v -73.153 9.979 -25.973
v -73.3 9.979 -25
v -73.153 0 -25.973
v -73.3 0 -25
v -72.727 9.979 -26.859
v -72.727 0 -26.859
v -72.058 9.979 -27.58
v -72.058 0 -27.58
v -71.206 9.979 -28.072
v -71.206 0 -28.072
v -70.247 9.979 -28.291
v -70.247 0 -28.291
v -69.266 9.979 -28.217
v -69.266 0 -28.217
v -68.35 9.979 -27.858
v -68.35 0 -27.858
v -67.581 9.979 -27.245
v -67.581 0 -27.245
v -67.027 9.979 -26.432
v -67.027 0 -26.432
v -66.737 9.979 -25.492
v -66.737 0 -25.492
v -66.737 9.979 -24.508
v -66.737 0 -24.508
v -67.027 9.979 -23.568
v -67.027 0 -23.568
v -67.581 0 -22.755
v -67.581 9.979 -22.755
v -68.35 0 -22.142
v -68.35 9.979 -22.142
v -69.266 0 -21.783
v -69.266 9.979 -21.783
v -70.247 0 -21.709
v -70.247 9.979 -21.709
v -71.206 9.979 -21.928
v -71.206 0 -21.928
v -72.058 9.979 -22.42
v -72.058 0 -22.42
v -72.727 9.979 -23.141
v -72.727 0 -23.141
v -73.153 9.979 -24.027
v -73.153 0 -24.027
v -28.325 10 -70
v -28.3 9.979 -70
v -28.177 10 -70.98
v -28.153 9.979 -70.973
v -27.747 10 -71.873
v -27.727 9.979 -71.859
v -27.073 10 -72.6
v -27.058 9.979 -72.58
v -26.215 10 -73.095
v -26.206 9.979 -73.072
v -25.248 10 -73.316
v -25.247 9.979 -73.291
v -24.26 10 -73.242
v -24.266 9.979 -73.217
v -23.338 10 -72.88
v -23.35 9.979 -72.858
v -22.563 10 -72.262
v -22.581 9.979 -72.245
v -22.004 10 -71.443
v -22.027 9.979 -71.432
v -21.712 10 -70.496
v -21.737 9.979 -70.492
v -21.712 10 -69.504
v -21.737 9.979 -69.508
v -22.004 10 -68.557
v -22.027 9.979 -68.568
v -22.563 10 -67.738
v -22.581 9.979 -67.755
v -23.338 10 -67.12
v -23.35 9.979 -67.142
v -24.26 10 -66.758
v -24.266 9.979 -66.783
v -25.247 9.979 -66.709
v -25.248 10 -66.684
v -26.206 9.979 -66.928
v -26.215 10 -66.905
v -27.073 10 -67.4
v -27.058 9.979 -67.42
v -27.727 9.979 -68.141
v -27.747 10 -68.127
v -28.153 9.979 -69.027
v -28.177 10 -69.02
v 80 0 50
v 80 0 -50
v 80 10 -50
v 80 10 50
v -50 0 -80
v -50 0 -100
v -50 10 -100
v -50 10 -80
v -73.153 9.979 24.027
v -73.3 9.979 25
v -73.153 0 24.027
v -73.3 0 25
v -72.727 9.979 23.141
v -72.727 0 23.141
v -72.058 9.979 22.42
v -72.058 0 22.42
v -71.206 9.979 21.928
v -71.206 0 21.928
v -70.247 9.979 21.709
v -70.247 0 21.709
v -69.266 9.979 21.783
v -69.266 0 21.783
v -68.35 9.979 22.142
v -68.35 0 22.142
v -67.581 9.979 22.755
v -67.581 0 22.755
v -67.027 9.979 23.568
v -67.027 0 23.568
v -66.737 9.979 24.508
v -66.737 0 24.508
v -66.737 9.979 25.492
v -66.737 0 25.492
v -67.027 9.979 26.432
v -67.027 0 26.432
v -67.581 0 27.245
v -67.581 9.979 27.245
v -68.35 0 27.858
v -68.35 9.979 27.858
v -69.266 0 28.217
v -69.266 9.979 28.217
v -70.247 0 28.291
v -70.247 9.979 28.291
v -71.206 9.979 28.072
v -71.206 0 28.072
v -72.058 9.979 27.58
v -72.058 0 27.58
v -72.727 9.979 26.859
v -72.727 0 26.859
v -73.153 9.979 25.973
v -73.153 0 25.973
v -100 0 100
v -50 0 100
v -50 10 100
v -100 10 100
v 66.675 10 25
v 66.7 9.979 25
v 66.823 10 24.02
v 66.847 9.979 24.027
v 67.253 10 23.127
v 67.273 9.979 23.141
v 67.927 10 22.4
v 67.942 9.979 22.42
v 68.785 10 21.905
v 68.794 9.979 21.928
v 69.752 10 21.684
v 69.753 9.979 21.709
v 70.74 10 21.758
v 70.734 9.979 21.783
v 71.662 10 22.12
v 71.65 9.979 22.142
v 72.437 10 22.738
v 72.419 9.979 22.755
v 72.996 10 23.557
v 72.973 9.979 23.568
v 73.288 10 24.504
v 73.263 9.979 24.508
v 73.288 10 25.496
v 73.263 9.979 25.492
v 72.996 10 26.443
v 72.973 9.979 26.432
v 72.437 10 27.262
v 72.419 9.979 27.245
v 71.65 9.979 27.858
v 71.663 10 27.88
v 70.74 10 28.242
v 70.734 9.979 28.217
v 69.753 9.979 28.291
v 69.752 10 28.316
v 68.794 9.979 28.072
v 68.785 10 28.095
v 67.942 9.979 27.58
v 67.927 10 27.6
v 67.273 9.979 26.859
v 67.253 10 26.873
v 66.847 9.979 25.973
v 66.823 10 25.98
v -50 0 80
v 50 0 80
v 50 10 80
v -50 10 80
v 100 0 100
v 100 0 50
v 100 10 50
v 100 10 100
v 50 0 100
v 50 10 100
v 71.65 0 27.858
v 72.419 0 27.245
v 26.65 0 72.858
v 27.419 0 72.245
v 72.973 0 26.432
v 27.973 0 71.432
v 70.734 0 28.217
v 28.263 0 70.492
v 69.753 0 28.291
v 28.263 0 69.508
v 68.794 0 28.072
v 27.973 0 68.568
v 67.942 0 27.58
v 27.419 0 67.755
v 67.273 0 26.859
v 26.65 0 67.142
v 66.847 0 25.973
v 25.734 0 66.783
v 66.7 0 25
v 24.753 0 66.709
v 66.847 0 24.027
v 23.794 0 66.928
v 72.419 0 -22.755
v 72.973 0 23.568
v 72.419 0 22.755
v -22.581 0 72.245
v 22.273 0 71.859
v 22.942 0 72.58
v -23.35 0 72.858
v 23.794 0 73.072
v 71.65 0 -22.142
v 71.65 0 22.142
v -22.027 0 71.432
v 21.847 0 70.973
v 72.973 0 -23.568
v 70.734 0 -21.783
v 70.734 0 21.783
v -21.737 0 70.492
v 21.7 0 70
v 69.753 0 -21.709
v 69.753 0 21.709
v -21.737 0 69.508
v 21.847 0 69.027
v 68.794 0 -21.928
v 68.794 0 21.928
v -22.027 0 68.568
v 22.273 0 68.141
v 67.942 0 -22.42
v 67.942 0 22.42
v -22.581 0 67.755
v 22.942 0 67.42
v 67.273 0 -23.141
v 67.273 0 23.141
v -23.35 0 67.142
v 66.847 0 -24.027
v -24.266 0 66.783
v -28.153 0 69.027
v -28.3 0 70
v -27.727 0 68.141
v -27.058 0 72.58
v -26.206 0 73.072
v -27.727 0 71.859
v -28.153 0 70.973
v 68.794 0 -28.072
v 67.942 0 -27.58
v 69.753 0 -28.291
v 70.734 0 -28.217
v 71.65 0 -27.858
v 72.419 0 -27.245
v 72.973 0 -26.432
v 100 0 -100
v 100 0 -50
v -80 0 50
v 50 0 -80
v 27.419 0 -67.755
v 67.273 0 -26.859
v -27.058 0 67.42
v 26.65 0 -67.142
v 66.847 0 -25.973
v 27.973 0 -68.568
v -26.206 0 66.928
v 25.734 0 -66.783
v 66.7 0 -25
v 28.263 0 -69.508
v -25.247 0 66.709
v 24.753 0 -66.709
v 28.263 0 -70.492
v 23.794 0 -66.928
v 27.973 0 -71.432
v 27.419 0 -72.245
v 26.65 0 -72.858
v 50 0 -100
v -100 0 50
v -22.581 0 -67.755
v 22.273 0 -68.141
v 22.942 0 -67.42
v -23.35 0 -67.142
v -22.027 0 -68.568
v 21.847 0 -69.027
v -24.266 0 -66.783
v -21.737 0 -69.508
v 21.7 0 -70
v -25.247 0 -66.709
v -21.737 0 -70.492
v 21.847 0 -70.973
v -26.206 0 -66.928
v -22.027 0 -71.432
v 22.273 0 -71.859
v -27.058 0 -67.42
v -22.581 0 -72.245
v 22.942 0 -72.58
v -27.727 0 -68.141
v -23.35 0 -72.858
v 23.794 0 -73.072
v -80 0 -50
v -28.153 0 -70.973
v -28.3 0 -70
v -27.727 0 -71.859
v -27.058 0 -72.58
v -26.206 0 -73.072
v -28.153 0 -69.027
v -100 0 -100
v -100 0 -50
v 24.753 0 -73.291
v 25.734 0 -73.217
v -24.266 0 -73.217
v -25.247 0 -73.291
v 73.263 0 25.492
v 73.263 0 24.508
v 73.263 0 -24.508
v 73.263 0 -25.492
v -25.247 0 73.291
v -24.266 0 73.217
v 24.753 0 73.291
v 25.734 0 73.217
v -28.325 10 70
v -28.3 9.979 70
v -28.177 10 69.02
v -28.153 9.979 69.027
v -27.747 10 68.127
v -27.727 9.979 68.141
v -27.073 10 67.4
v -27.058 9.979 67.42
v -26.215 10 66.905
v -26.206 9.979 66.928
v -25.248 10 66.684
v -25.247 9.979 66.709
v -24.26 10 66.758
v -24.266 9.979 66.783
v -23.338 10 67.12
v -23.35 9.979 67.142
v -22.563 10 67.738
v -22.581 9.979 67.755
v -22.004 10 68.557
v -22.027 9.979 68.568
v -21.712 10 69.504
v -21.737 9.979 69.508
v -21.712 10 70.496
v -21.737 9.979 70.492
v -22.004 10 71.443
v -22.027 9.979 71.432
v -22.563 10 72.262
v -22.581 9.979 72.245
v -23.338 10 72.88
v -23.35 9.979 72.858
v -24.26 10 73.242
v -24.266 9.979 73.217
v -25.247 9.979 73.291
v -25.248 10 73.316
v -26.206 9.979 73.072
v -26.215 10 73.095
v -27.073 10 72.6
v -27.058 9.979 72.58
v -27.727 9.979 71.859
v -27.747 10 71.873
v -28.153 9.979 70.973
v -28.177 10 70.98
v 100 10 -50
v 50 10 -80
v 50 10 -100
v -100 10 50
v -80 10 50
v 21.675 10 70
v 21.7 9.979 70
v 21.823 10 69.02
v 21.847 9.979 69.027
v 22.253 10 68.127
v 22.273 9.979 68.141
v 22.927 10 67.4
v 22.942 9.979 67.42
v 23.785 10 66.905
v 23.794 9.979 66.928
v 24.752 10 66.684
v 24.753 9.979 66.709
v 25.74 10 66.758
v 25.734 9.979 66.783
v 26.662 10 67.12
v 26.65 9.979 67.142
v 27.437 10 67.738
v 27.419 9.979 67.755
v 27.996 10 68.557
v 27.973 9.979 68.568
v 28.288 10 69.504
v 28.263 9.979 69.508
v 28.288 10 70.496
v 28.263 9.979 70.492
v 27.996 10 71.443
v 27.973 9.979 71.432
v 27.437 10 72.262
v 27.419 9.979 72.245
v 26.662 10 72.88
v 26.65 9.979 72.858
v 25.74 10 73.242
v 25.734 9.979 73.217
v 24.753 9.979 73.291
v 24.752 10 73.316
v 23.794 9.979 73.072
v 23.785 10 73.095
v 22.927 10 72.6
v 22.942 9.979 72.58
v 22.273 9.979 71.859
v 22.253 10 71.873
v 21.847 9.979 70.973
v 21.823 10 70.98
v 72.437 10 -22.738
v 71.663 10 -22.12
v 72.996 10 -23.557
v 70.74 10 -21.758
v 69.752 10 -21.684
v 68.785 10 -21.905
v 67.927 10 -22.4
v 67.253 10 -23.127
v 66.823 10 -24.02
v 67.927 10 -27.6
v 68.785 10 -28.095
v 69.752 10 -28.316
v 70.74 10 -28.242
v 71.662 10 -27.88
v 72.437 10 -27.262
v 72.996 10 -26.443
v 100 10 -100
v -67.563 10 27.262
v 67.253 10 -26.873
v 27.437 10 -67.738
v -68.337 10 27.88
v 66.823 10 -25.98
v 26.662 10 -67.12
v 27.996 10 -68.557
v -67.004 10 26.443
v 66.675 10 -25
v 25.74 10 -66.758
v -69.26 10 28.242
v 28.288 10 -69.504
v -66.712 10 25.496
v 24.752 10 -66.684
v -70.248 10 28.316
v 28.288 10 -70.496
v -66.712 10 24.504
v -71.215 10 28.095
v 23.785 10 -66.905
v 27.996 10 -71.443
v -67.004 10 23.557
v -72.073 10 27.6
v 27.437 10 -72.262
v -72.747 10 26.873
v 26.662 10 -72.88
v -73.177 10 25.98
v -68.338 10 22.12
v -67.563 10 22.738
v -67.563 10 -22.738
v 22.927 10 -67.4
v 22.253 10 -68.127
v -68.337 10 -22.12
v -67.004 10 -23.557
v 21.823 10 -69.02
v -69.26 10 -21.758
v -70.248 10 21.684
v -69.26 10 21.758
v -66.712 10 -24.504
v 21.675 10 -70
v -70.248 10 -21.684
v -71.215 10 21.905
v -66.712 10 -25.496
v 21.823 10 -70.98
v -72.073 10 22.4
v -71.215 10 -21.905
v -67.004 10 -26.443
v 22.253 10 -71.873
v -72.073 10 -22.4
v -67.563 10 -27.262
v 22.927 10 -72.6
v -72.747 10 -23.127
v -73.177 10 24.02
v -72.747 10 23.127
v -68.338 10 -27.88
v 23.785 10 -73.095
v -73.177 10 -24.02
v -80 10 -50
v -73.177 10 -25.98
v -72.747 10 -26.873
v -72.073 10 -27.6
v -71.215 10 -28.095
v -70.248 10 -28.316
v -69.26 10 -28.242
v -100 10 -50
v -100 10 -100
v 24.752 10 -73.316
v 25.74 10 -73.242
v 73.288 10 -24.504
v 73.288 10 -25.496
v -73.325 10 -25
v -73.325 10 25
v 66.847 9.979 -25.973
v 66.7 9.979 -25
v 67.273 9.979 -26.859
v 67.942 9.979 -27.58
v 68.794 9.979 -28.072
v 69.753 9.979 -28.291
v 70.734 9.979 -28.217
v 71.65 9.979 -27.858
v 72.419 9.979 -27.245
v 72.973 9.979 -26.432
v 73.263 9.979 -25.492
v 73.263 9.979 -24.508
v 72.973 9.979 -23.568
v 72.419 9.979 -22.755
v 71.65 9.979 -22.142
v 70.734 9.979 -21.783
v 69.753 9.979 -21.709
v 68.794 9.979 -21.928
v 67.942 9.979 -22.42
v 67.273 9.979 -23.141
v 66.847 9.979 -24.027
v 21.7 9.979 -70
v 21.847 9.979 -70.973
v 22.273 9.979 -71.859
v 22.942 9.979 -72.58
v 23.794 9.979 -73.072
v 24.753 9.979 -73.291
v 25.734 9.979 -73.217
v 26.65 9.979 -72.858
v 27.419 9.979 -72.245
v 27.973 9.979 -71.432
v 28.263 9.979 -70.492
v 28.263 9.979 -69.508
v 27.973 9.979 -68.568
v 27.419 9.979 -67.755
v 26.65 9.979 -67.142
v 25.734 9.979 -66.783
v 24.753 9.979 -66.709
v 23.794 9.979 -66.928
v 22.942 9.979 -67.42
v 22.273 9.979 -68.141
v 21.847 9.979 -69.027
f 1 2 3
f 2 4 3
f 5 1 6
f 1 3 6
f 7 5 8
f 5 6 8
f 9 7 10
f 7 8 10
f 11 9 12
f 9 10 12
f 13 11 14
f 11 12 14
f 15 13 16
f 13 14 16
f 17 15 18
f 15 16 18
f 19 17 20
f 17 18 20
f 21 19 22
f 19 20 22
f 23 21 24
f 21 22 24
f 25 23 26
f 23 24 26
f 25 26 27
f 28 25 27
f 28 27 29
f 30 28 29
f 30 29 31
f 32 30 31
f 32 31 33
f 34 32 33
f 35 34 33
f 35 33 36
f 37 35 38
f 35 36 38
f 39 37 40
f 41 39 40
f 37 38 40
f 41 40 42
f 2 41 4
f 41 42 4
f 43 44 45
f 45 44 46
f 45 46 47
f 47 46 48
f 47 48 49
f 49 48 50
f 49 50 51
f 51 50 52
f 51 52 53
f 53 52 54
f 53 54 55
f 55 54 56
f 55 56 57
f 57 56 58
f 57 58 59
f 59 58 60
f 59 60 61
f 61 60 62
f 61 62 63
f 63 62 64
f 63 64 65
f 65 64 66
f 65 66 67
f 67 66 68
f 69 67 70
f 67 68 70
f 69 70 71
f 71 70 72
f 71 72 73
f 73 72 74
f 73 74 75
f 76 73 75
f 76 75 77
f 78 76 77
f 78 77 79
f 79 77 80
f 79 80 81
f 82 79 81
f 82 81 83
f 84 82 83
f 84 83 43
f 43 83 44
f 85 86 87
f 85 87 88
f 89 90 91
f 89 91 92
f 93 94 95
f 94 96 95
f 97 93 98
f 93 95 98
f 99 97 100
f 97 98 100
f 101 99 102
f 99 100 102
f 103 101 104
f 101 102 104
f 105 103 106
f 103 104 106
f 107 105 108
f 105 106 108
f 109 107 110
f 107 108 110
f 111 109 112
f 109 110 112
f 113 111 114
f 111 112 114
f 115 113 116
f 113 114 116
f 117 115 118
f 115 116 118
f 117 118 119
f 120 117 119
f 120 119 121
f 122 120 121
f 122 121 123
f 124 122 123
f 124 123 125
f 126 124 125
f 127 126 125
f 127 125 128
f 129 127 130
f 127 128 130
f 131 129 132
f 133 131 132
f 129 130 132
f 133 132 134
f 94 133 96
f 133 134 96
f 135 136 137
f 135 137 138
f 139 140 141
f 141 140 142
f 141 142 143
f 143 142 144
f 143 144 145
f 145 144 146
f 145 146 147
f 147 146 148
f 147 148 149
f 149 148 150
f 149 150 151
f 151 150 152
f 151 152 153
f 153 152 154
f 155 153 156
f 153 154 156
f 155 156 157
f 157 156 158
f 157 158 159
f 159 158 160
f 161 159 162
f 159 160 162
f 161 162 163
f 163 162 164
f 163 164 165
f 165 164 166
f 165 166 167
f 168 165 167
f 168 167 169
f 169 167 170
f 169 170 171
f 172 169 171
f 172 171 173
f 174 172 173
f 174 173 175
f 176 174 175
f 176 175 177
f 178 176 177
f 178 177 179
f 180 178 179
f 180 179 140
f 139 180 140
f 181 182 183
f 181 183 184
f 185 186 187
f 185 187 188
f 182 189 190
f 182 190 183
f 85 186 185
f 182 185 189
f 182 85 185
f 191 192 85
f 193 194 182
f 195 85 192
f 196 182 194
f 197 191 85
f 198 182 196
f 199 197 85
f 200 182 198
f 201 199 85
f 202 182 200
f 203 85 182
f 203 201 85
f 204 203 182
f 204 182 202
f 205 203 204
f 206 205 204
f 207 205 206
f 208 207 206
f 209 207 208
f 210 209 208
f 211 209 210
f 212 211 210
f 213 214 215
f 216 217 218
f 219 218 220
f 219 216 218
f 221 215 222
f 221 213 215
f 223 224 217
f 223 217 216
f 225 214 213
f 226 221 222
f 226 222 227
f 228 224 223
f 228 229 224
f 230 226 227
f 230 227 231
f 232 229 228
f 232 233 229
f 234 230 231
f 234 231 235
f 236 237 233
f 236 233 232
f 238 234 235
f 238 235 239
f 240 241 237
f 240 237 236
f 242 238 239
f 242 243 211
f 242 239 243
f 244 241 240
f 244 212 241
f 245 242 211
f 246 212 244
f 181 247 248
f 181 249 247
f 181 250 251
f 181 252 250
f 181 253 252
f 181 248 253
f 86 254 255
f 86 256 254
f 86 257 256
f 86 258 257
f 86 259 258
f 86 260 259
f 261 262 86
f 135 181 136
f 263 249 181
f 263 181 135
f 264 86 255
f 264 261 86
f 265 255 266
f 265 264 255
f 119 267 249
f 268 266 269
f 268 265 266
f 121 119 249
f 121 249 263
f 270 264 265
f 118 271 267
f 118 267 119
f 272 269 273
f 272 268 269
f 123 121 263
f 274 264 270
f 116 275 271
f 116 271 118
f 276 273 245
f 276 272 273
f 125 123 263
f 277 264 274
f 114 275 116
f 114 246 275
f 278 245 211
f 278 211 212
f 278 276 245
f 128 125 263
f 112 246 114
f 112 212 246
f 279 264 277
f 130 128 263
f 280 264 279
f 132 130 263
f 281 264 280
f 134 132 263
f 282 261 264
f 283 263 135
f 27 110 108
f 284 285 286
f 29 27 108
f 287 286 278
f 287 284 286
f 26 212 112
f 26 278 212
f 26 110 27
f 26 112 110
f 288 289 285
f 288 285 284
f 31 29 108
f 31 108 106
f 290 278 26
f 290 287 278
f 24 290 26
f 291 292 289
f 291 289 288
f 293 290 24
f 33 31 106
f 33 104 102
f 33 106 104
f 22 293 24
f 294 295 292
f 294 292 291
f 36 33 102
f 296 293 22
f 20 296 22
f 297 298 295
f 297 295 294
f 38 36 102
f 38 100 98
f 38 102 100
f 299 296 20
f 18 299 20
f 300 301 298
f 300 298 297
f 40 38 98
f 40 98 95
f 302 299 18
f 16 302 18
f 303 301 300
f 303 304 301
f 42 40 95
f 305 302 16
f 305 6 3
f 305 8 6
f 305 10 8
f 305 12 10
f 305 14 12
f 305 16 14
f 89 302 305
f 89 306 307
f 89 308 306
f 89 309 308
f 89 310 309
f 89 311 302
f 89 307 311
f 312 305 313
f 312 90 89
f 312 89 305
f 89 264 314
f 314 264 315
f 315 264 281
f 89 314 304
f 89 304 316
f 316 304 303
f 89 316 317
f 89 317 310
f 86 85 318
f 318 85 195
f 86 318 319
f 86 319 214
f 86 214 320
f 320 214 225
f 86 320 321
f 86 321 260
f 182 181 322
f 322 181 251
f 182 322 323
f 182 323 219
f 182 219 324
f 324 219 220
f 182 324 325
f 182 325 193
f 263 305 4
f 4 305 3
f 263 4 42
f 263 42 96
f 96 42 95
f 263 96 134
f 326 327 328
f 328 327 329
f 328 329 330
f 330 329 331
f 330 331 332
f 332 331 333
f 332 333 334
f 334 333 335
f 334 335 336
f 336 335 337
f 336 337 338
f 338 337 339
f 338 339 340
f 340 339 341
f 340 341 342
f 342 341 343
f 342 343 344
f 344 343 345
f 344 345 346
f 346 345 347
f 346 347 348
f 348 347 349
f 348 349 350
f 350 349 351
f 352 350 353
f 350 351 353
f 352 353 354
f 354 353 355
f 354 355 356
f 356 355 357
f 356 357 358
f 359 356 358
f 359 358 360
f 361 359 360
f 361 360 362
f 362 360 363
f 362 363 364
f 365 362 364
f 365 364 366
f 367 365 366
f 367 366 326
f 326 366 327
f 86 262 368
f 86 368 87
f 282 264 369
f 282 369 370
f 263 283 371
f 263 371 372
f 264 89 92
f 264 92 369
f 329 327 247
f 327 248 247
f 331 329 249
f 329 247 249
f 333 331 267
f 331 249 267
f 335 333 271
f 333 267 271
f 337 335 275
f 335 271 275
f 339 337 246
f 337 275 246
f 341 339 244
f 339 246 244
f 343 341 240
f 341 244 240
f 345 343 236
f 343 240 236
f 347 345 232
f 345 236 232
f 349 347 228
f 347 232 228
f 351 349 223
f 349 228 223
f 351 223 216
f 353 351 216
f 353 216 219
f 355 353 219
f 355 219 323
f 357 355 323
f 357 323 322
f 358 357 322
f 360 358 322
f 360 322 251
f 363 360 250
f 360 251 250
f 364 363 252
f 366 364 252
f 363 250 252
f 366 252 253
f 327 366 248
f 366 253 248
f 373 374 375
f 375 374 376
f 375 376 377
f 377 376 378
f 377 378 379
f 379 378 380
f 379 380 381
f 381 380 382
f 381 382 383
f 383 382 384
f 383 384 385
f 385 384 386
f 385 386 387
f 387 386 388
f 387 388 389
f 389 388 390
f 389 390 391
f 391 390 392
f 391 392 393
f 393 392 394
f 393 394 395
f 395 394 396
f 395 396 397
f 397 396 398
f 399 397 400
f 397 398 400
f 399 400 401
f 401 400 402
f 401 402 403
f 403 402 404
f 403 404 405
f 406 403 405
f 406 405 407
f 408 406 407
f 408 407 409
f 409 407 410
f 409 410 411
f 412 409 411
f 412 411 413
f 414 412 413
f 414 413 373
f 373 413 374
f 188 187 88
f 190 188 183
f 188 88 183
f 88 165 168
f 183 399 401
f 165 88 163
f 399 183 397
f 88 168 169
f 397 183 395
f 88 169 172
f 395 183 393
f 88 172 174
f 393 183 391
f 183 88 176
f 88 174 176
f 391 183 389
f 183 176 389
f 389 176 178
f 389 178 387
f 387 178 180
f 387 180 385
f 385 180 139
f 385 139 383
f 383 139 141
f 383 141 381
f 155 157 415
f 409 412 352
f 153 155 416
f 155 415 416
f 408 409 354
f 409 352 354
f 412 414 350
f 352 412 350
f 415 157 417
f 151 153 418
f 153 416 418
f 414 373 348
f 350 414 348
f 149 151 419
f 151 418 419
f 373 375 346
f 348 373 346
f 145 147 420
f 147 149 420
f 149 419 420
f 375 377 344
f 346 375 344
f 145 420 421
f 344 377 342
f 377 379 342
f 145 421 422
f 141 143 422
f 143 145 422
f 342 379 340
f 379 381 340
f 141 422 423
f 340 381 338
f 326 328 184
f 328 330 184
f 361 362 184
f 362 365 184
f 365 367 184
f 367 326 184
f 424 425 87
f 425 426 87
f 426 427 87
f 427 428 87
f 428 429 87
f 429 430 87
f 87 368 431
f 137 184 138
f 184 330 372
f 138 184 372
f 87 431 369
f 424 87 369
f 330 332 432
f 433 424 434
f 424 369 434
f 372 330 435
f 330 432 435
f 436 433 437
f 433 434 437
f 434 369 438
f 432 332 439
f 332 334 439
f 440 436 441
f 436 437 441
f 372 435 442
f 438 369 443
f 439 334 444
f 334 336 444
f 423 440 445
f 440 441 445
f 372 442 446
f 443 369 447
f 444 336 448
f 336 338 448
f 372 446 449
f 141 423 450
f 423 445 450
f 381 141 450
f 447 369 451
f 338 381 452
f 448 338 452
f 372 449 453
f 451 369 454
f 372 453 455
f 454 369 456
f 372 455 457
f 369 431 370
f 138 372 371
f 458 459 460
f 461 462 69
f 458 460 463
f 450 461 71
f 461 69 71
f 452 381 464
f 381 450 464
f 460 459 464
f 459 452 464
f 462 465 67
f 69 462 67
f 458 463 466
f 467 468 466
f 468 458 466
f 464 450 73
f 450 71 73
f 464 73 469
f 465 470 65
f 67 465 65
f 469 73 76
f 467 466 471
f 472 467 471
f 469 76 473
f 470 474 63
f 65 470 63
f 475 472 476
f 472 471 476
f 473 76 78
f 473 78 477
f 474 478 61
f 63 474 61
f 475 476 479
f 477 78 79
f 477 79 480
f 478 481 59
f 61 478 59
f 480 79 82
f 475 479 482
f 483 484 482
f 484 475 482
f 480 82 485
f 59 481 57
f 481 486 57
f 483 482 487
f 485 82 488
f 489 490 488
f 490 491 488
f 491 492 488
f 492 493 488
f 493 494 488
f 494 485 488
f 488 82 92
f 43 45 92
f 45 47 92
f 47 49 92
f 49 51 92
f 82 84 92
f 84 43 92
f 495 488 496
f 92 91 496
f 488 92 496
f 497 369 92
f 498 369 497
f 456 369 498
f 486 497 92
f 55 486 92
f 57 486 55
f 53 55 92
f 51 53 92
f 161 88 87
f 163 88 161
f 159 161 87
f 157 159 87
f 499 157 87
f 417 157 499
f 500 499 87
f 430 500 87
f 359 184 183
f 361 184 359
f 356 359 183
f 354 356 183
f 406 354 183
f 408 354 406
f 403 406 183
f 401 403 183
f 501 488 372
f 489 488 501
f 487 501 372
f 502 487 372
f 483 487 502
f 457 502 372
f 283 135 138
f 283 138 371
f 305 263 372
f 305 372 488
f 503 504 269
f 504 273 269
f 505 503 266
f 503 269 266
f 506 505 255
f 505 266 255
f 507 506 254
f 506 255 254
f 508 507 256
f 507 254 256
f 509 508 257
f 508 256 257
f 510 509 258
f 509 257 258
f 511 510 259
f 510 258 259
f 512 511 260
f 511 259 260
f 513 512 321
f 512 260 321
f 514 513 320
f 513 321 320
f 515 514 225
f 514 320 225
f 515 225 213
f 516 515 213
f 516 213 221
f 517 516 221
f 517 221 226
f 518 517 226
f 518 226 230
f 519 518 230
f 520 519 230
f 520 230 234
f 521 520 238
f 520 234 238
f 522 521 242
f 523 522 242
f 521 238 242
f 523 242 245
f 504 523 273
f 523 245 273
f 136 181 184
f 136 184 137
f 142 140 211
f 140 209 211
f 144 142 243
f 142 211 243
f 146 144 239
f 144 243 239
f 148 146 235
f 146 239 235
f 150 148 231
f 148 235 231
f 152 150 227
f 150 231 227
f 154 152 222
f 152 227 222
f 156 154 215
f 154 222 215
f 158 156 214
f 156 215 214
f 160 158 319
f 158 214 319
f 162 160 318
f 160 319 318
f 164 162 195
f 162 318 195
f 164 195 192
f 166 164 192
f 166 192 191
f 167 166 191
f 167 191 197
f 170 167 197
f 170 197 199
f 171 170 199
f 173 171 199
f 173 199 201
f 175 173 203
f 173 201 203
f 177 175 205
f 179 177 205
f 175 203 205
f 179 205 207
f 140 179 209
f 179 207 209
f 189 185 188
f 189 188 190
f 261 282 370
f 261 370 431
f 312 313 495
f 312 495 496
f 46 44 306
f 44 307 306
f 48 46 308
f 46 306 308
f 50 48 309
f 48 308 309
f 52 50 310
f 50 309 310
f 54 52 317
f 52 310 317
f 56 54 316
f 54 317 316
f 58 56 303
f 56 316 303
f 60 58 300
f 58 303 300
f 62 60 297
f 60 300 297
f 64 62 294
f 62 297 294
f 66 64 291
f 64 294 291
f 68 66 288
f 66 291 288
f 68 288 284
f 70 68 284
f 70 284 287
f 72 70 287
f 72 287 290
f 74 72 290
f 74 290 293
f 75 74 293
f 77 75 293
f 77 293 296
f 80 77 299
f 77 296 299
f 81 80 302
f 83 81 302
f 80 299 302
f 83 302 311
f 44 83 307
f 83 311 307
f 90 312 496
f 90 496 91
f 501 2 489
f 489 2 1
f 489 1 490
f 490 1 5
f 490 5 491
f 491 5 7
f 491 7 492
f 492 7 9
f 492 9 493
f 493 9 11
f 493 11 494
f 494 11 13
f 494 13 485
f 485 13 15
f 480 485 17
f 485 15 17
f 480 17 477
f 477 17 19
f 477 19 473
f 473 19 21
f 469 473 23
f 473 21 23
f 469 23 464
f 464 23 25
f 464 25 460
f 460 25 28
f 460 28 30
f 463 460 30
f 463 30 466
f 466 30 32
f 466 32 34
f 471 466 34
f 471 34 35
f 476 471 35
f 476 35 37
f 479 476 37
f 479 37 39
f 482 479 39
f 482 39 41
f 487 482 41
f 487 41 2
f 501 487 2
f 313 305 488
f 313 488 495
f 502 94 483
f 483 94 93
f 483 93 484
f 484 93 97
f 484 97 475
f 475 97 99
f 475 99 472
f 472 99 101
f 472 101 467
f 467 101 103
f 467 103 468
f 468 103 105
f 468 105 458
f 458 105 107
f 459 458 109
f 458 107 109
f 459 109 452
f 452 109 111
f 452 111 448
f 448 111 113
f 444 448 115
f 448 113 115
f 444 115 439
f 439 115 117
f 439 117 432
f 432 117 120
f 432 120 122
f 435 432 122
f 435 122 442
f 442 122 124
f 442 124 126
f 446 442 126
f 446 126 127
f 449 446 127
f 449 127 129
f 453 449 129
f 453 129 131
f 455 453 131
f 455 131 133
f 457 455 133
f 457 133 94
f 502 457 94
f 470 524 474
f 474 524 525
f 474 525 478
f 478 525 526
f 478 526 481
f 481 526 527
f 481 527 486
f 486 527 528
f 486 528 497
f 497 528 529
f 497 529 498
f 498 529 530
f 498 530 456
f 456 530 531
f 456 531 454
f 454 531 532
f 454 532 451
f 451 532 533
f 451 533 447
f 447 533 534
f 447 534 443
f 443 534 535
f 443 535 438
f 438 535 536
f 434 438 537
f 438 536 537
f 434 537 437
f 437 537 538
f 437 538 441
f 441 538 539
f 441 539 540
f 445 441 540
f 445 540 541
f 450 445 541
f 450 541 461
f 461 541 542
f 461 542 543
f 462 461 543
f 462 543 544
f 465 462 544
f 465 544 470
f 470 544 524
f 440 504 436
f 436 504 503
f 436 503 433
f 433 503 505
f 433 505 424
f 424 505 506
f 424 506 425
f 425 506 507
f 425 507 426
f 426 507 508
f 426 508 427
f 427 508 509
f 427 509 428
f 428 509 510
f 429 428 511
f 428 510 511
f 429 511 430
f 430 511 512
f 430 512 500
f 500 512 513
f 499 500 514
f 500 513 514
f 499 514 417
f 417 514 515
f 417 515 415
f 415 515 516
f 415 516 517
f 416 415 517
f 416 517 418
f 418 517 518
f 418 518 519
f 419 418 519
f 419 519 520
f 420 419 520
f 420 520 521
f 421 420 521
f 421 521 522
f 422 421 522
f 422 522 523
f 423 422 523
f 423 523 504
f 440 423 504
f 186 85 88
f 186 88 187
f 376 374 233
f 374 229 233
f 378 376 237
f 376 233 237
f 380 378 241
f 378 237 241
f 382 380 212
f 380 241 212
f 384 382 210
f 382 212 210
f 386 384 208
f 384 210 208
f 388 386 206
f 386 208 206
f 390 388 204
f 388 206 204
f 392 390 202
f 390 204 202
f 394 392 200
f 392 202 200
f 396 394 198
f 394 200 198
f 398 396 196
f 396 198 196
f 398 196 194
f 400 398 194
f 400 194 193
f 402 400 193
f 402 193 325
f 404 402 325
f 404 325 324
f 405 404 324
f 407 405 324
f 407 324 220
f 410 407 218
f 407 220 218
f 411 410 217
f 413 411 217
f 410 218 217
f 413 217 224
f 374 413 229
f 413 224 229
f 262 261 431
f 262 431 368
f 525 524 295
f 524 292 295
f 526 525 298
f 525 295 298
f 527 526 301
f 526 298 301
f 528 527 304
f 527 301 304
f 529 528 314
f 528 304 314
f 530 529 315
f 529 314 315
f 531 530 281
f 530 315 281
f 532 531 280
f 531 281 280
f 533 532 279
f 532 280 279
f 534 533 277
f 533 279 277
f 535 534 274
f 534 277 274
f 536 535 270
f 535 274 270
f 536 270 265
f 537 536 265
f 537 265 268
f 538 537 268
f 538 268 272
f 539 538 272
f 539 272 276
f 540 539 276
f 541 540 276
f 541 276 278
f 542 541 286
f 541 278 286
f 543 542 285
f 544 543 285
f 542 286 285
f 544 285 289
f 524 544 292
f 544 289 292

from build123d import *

# Parameters (mm, degrees)
BOSS_EXTRUDE1_DEPTH            = 10
M6_CLEARANCE_HOLE1_D           = 6.6
M6_CLEARANCE_HOLE1_CSINK_D     = 6.65
M6_CLEARANCE_HOLE1_CSINK_ANGLE = 100


with BuildPart() as part:
    # Sketch1 → Boss-Extrude1 (new body)
    with BuildSketch(Plane(origin=(0, 0, 0), x_dir=(1, 0, 0), z_dir=(0, 1, 0))):
        Polygon((-50, 80), (50, 80), (50, 100), (100, 100), (100, 50), (80, 50), (80, -50), (100, -50), (100, -100), (50, -100), (50, -80), (-50, -80), (-50, -100), (-100, -100), (-100, -50), (-80, -50), (-80, 50), (-100, 50), (-100, 100), (-50, 100), align=None)
    extrude(amount=BOSS_EXTRUDE1_DEPTH)

    # M6 Clearance Hole1 (through all)
    with Locations(Plane(origin=(0, 10, 0), x_dir=(1, 0, 0), z_dir=(0, 1, 0))):
        with Locations((-70, -25), (-70, 25), (-25, 70), (25, 70), (70, 25), (70, -25), (-25, -70), (25, -70)):
            CounterSinkHole(M6_CLEARANCE_HOLE1_D / 2, M6_CLEARANCE_HOLE1_CSINK_D / 2, counter_sink_angle=M6_CLEARANCE_HOLE1_CSINK_ANGLE)


solid = part.part
